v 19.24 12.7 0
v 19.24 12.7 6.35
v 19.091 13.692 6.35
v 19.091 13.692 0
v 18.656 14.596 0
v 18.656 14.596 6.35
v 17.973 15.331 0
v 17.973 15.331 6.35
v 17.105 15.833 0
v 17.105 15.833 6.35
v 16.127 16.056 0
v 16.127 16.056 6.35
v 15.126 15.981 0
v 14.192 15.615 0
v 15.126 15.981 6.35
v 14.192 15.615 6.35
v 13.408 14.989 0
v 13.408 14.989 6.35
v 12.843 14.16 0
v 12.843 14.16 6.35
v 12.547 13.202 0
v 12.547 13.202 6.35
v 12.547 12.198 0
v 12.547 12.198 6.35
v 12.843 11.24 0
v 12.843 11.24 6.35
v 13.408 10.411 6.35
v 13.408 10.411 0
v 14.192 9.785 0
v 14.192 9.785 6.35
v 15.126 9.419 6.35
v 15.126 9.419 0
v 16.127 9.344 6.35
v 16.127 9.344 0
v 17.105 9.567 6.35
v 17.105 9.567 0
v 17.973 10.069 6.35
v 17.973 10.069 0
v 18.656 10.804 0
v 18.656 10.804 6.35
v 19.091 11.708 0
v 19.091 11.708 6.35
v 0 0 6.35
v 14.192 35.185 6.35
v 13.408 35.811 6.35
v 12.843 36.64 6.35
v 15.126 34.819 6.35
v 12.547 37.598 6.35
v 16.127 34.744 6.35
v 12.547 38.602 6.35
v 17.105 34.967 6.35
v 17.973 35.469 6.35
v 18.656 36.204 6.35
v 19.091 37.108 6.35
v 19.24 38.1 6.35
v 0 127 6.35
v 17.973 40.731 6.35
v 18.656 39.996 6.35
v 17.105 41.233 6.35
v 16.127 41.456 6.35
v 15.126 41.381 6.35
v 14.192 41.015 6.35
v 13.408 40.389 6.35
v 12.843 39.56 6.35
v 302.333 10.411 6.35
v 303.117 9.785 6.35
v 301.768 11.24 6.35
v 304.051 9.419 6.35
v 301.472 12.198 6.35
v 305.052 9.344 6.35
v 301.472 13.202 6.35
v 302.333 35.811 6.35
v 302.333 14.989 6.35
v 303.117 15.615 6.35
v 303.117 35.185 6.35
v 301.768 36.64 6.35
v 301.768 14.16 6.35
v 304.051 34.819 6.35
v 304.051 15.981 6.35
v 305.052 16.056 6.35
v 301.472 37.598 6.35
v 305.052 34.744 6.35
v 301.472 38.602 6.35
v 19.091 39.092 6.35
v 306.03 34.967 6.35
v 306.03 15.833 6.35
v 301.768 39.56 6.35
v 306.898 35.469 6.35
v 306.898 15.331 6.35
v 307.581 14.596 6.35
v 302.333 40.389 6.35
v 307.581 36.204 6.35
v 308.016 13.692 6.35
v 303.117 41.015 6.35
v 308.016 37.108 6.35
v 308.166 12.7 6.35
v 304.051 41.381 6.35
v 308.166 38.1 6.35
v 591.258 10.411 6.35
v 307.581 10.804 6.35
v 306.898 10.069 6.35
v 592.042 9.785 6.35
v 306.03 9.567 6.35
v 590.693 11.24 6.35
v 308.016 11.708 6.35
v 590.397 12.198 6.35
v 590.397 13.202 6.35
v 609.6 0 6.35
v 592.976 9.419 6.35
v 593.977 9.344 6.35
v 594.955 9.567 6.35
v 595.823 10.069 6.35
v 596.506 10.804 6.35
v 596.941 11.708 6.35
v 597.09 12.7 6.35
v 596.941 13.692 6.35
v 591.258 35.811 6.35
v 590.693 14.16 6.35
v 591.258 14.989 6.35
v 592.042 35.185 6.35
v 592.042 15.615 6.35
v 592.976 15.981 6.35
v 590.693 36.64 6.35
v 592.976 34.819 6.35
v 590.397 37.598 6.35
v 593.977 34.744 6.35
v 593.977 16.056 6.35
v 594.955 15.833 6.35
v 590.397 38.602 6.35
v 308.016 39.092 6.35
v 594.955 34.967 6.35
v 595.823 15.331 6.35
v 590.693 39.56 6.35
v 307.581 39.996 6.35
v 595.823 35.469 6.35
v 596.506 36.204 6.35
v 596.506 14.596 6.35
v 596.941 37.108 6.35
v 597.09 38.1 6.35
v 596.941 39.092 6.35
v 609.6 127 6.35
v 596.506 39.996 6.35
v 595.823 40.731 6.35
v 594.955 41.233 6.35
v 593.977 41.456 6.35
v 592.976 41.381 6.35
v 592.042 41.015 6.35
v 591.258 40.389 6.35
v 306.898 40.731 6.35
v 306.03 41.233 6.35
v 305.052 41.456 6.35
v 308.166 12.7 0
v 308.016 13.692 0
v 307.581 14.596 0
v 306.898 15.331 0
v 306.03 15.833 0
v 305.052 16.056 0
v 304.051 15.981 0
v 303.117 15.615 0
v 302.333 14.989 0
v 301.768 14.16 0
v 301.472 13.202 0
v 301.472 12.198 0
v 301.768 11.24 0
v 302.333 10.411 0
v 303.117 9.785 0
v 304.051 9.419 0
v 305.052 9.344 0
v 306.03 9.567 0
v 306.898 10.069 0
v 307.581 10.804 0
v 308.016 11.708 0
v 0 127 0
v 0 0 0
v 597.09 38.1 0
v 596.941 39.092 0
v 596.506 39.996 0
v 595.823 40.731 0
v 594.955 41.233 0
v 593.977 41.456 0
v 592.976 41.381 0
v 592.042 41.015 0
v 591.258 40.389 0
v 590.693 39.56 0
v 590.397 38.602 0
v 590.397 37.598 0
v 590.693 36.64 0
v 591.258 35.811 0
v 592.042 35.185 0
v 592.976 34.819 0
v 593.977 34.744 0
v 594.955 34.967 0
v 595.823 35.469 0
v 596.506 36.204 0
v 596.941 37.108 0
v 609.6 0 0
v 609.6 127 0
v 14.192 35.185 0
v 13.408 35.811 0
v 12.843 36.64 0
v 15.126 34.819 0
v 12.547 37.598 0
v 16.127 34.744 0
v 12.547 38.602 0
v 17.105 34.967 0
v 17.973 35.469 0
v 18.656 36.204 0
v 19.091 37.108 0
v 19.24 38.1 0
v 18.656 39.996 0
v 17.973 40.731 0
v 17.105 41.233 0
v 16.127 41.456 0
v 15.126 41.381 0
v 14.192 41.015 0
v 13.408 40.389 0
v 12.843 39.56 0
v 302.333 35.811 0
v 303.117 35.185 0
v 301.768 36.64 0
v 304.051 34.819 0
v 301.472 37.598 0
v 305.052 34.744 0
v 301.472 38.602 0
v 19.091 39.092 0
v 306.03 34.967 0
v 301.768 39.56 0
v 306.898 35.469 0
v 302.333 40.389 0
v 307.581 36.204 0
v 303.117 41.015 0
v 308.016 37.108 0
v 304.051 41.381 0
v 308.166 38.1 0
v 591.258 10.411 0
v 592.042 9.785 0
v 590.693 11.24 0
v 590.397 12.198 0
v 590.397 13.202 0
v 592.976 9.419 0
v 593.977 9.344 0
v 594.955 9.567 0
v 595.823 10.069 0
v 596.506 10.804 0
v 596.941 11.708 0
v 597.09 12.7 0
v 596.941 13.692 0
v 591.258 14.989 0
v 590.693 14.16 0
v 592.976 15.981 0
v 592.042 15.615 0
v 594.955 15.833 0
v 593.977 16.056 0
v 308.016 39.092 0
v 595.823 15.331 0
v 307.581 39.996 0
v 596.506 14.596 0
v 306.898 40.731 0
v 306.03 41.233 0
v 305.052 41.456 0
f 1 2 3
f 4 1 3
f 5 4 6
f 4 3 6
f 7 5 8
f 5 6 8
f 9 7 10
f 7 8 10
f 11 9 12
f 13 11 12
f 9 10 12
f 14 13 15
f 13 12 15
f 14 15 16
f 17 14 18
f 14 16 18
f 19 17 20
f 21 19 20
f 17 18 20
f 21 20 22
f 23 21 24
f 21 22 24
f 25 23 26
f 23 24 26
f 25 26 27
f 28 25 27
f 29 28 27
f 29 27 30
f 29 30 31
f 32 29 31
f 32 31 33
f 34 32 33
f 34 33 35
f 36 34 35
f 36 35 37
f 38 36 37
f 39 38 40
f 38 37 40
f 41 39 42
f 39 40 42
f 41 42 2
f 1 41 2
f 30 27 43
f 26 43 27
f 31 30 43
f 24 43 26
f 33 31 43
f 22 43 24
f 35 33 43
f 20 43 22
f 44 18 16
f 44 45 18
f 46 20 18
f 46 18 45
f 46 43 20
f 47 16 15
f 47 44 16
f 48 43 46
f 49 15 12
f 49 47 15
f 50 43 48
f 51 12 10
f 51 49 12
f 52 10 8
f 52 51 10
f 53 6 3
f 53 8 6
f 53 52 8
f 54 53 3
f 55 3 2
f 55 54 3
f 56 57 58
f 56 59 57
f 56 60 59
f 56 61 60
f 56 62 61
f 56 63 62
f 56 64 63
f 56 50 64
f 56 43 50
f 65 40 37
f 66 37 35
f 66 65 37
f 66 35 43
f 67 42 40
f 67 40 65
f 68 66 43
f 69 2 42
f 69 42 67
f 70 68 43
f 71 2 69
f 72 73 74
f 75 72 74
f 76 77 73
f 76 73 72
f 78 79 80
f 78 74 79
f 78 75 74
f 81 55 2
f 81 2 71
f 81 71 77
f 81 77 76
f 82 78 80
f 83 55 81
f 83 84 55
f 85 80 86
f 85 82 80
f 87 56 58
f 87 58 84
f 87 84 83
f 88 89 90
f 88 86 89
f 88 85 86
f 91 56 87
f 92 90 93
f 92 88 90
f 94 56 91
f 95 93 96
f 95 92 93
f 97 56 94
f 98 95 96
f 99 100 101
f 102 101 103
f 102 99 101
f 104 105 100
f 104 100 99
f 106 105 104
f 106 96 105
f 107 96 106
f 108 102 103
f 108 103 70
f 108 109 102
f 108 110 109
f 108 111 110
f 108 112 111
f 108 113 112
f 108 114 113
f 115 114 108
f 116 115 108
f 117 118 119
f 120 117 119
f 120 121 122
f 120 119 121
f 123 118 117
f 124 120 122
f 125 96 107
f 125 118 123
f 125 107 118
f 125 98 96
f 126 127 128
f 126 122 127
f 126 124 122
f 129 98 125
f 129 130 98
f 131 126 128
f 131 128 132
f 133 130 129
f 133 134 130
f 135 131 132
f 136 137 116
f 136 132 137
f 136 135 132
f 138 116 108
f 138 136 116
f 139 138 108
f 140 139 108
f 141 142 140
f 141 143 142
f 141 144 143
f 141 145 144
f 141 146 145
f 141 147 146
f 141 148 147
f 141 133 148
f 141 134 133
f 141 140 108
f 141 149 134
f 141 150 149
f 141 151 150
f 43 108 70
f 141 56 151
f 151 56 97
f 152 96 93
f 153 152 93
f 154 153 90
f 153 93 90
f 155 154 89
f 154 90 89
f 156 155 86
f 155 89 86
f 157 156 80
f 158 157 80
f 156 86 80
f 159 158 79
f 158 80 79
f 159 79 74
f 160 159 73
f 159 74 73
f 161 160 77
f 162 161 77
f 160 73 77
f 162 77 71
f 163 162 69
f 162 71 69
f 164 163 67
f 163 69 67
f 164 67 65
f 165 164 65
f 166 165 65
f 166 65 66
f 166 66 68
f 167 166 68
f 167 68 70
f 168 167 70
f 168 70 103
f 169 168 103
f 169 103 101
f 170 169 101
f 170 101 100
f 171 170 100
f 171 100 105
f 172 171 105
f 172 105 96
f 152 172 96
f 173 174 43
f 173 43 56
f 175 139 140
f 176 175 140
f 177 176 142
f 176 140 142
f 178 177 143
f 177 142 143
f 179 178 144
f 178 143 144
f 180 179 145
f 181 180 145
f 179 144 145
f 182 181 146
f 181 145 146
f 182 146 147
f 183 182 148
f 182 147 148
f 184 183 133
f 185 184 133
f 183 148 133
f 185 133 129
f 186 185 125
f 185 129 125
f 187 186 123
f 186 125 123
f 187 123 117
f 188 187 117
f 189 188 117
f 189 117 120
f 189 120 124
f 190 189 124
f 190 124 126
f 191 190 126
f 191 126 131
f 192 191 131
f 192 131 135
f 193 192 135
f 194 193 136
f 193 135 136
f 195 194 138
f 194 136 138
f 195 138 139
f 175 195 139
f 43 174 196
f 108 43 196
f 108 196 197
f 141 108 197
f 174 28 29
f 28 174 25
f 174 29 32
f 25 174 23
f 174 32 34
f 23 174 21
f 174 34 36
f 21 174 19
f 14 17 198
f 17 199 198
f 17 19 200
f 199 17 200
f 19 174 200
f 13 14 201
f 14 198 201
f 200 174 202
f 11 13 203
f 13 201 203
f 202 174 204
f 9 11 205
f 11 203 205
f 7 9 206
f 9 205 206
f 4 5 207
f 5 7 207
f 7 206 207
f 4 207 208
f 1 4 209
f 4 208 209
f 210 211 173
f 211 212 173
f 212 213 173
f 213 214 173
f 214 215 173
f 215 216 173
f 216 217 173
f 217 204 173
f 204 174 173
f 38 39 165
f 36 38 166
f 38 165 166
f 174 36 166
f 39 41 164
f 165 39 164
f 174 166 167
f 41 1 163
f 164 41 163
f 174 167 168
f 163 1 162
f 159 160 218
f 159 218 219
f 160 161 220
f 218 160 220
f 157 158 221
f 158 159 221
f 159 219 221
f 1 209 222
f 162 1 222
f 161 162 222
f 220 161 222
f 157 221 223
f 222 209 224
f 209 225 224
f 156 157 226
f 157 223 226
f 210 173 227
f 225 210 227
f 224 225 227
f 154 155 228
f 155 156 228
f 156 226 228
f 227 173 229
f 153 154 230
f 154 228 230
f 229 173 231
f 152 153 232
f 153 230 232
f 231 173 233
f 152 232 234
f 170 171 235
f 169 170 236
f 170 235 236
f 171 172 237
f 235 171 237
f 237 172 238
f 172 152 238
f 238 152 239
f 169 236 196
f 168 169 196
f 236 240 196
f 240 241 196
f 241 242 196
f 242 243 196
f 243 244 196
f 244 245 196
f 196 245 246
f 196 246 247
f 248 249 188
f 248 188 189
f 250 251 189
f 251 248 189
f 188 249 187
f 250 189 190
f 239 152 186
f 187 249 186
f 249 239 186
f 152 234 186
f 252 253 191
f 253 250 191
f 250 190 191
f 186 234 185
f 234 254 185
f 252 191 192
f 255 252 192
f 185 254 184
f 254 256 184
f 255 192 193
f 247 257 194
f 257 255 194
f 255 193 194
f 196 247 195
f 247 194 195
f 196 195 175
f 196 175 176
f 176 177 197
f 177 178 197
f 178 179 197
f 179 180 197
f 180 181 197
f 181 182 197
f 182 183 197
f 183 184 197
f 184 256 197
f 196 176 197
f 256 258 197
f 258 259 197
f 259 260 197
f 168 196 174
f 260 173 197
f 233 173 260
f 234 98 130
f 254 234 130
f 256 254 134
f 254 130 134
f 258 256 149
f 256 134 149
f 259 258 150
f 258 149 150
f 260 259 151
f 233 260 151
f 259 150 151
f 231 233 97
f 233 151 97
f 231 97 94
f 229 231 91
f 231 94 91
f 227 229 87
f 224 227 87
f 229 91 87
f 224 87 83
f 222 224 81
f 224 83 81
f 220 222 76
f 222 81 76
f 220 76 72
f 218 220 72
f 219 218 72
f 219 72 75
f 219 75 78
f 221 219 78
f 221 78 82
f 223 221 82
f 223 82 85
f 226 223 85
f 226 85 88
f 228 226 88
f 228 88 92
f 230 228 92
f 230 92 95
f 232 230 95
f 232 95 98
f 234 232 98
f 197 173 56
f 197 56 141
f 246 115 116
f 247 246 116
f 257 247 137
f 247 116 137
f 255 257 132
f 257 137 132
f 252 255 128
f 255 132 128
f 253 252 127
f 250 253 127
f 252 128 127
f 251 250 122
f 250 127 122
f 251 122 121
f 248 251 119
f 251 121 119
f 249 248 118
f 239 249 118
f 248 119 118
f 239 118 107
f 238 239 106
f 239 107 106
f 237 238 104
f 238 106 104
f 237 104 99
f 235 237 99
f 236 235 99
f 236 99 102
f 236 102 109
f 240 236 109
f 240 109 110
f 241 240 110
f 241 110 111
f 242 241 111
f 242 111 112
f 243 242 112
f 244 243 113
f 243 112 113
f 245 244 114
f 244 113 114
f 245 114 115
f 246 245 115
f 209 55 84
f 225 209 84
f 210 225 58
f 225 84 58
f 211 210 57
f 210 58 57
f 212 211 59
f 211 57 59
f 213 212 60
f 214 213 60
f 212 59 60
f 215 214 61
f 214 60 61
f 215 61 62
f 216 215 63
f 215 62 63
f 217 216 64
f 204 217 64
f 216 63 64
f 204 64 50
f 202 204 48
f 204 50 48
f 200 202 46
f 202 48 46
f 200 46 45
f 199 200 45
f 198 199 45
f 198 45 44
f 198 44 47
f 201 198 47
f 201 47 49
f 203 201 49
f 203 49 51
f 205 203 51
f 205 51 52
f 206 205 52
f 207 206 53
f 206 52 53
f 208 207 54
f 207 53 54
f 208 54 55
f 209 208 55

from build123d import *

# Parameters (mm, degrees)
SKETCH2_W           = 609.6
SKETCH2_H           = 127
BOSS_EXTRUDE1_DEPTH = 6.35
SKETCH3_R           = 3.3655
CUT_EXTRUDE1_DEPTH  = 6.35
SKETCH6_R           = 3.3655
CUT_EXTRUDE4_DEPTH  = 7.35


with BuildPart() as part:
    # Sketch2 → Boss-Extrude1 (new body)
    with BuildSketch(Plane.XY):
        with Locations((304.8, 63.5)):
            Rectangle(SKETCH2_W, SKETCH2_H)
    extrude(amount=BOSS_EXTRUDE1_DEPTH)

    # Sketch3 → Cut-Extrude1 (cut)
    with BuildSketch(Plane.XY.offset(6.35)):
        with Locations((15.875, 12.7)):
            Circle(SKETCH3_R)
        with Locations((593.725, 12.7)):
            Circle(SKETCH3_R)
        with Locations((593.725, 38.1)):
            Circle(SKETCH3_R)
        with Locations((15.875, 38.1)):
            Circle(SKETCH3_R)
    extrude(amount=-CUT_EXTRUDE1_DEPTH, mode=Mode.SUBTRACT)

    # Sketch6 → Cut-Extrude4 (cut, through all)
    with BuildSketch(Plane.XY.offset(6.35)):
        with Locations((304.8, 38.1)):
            Circle(SKETCH6_R)
        with Locations((304.8, 12.7)):
            Circle(SKETCH6_R)
    extrude(amount=-CUT_EXTRUDE4_DEPTH, mode=Mode.SUBTRACT)


solid = part.part
